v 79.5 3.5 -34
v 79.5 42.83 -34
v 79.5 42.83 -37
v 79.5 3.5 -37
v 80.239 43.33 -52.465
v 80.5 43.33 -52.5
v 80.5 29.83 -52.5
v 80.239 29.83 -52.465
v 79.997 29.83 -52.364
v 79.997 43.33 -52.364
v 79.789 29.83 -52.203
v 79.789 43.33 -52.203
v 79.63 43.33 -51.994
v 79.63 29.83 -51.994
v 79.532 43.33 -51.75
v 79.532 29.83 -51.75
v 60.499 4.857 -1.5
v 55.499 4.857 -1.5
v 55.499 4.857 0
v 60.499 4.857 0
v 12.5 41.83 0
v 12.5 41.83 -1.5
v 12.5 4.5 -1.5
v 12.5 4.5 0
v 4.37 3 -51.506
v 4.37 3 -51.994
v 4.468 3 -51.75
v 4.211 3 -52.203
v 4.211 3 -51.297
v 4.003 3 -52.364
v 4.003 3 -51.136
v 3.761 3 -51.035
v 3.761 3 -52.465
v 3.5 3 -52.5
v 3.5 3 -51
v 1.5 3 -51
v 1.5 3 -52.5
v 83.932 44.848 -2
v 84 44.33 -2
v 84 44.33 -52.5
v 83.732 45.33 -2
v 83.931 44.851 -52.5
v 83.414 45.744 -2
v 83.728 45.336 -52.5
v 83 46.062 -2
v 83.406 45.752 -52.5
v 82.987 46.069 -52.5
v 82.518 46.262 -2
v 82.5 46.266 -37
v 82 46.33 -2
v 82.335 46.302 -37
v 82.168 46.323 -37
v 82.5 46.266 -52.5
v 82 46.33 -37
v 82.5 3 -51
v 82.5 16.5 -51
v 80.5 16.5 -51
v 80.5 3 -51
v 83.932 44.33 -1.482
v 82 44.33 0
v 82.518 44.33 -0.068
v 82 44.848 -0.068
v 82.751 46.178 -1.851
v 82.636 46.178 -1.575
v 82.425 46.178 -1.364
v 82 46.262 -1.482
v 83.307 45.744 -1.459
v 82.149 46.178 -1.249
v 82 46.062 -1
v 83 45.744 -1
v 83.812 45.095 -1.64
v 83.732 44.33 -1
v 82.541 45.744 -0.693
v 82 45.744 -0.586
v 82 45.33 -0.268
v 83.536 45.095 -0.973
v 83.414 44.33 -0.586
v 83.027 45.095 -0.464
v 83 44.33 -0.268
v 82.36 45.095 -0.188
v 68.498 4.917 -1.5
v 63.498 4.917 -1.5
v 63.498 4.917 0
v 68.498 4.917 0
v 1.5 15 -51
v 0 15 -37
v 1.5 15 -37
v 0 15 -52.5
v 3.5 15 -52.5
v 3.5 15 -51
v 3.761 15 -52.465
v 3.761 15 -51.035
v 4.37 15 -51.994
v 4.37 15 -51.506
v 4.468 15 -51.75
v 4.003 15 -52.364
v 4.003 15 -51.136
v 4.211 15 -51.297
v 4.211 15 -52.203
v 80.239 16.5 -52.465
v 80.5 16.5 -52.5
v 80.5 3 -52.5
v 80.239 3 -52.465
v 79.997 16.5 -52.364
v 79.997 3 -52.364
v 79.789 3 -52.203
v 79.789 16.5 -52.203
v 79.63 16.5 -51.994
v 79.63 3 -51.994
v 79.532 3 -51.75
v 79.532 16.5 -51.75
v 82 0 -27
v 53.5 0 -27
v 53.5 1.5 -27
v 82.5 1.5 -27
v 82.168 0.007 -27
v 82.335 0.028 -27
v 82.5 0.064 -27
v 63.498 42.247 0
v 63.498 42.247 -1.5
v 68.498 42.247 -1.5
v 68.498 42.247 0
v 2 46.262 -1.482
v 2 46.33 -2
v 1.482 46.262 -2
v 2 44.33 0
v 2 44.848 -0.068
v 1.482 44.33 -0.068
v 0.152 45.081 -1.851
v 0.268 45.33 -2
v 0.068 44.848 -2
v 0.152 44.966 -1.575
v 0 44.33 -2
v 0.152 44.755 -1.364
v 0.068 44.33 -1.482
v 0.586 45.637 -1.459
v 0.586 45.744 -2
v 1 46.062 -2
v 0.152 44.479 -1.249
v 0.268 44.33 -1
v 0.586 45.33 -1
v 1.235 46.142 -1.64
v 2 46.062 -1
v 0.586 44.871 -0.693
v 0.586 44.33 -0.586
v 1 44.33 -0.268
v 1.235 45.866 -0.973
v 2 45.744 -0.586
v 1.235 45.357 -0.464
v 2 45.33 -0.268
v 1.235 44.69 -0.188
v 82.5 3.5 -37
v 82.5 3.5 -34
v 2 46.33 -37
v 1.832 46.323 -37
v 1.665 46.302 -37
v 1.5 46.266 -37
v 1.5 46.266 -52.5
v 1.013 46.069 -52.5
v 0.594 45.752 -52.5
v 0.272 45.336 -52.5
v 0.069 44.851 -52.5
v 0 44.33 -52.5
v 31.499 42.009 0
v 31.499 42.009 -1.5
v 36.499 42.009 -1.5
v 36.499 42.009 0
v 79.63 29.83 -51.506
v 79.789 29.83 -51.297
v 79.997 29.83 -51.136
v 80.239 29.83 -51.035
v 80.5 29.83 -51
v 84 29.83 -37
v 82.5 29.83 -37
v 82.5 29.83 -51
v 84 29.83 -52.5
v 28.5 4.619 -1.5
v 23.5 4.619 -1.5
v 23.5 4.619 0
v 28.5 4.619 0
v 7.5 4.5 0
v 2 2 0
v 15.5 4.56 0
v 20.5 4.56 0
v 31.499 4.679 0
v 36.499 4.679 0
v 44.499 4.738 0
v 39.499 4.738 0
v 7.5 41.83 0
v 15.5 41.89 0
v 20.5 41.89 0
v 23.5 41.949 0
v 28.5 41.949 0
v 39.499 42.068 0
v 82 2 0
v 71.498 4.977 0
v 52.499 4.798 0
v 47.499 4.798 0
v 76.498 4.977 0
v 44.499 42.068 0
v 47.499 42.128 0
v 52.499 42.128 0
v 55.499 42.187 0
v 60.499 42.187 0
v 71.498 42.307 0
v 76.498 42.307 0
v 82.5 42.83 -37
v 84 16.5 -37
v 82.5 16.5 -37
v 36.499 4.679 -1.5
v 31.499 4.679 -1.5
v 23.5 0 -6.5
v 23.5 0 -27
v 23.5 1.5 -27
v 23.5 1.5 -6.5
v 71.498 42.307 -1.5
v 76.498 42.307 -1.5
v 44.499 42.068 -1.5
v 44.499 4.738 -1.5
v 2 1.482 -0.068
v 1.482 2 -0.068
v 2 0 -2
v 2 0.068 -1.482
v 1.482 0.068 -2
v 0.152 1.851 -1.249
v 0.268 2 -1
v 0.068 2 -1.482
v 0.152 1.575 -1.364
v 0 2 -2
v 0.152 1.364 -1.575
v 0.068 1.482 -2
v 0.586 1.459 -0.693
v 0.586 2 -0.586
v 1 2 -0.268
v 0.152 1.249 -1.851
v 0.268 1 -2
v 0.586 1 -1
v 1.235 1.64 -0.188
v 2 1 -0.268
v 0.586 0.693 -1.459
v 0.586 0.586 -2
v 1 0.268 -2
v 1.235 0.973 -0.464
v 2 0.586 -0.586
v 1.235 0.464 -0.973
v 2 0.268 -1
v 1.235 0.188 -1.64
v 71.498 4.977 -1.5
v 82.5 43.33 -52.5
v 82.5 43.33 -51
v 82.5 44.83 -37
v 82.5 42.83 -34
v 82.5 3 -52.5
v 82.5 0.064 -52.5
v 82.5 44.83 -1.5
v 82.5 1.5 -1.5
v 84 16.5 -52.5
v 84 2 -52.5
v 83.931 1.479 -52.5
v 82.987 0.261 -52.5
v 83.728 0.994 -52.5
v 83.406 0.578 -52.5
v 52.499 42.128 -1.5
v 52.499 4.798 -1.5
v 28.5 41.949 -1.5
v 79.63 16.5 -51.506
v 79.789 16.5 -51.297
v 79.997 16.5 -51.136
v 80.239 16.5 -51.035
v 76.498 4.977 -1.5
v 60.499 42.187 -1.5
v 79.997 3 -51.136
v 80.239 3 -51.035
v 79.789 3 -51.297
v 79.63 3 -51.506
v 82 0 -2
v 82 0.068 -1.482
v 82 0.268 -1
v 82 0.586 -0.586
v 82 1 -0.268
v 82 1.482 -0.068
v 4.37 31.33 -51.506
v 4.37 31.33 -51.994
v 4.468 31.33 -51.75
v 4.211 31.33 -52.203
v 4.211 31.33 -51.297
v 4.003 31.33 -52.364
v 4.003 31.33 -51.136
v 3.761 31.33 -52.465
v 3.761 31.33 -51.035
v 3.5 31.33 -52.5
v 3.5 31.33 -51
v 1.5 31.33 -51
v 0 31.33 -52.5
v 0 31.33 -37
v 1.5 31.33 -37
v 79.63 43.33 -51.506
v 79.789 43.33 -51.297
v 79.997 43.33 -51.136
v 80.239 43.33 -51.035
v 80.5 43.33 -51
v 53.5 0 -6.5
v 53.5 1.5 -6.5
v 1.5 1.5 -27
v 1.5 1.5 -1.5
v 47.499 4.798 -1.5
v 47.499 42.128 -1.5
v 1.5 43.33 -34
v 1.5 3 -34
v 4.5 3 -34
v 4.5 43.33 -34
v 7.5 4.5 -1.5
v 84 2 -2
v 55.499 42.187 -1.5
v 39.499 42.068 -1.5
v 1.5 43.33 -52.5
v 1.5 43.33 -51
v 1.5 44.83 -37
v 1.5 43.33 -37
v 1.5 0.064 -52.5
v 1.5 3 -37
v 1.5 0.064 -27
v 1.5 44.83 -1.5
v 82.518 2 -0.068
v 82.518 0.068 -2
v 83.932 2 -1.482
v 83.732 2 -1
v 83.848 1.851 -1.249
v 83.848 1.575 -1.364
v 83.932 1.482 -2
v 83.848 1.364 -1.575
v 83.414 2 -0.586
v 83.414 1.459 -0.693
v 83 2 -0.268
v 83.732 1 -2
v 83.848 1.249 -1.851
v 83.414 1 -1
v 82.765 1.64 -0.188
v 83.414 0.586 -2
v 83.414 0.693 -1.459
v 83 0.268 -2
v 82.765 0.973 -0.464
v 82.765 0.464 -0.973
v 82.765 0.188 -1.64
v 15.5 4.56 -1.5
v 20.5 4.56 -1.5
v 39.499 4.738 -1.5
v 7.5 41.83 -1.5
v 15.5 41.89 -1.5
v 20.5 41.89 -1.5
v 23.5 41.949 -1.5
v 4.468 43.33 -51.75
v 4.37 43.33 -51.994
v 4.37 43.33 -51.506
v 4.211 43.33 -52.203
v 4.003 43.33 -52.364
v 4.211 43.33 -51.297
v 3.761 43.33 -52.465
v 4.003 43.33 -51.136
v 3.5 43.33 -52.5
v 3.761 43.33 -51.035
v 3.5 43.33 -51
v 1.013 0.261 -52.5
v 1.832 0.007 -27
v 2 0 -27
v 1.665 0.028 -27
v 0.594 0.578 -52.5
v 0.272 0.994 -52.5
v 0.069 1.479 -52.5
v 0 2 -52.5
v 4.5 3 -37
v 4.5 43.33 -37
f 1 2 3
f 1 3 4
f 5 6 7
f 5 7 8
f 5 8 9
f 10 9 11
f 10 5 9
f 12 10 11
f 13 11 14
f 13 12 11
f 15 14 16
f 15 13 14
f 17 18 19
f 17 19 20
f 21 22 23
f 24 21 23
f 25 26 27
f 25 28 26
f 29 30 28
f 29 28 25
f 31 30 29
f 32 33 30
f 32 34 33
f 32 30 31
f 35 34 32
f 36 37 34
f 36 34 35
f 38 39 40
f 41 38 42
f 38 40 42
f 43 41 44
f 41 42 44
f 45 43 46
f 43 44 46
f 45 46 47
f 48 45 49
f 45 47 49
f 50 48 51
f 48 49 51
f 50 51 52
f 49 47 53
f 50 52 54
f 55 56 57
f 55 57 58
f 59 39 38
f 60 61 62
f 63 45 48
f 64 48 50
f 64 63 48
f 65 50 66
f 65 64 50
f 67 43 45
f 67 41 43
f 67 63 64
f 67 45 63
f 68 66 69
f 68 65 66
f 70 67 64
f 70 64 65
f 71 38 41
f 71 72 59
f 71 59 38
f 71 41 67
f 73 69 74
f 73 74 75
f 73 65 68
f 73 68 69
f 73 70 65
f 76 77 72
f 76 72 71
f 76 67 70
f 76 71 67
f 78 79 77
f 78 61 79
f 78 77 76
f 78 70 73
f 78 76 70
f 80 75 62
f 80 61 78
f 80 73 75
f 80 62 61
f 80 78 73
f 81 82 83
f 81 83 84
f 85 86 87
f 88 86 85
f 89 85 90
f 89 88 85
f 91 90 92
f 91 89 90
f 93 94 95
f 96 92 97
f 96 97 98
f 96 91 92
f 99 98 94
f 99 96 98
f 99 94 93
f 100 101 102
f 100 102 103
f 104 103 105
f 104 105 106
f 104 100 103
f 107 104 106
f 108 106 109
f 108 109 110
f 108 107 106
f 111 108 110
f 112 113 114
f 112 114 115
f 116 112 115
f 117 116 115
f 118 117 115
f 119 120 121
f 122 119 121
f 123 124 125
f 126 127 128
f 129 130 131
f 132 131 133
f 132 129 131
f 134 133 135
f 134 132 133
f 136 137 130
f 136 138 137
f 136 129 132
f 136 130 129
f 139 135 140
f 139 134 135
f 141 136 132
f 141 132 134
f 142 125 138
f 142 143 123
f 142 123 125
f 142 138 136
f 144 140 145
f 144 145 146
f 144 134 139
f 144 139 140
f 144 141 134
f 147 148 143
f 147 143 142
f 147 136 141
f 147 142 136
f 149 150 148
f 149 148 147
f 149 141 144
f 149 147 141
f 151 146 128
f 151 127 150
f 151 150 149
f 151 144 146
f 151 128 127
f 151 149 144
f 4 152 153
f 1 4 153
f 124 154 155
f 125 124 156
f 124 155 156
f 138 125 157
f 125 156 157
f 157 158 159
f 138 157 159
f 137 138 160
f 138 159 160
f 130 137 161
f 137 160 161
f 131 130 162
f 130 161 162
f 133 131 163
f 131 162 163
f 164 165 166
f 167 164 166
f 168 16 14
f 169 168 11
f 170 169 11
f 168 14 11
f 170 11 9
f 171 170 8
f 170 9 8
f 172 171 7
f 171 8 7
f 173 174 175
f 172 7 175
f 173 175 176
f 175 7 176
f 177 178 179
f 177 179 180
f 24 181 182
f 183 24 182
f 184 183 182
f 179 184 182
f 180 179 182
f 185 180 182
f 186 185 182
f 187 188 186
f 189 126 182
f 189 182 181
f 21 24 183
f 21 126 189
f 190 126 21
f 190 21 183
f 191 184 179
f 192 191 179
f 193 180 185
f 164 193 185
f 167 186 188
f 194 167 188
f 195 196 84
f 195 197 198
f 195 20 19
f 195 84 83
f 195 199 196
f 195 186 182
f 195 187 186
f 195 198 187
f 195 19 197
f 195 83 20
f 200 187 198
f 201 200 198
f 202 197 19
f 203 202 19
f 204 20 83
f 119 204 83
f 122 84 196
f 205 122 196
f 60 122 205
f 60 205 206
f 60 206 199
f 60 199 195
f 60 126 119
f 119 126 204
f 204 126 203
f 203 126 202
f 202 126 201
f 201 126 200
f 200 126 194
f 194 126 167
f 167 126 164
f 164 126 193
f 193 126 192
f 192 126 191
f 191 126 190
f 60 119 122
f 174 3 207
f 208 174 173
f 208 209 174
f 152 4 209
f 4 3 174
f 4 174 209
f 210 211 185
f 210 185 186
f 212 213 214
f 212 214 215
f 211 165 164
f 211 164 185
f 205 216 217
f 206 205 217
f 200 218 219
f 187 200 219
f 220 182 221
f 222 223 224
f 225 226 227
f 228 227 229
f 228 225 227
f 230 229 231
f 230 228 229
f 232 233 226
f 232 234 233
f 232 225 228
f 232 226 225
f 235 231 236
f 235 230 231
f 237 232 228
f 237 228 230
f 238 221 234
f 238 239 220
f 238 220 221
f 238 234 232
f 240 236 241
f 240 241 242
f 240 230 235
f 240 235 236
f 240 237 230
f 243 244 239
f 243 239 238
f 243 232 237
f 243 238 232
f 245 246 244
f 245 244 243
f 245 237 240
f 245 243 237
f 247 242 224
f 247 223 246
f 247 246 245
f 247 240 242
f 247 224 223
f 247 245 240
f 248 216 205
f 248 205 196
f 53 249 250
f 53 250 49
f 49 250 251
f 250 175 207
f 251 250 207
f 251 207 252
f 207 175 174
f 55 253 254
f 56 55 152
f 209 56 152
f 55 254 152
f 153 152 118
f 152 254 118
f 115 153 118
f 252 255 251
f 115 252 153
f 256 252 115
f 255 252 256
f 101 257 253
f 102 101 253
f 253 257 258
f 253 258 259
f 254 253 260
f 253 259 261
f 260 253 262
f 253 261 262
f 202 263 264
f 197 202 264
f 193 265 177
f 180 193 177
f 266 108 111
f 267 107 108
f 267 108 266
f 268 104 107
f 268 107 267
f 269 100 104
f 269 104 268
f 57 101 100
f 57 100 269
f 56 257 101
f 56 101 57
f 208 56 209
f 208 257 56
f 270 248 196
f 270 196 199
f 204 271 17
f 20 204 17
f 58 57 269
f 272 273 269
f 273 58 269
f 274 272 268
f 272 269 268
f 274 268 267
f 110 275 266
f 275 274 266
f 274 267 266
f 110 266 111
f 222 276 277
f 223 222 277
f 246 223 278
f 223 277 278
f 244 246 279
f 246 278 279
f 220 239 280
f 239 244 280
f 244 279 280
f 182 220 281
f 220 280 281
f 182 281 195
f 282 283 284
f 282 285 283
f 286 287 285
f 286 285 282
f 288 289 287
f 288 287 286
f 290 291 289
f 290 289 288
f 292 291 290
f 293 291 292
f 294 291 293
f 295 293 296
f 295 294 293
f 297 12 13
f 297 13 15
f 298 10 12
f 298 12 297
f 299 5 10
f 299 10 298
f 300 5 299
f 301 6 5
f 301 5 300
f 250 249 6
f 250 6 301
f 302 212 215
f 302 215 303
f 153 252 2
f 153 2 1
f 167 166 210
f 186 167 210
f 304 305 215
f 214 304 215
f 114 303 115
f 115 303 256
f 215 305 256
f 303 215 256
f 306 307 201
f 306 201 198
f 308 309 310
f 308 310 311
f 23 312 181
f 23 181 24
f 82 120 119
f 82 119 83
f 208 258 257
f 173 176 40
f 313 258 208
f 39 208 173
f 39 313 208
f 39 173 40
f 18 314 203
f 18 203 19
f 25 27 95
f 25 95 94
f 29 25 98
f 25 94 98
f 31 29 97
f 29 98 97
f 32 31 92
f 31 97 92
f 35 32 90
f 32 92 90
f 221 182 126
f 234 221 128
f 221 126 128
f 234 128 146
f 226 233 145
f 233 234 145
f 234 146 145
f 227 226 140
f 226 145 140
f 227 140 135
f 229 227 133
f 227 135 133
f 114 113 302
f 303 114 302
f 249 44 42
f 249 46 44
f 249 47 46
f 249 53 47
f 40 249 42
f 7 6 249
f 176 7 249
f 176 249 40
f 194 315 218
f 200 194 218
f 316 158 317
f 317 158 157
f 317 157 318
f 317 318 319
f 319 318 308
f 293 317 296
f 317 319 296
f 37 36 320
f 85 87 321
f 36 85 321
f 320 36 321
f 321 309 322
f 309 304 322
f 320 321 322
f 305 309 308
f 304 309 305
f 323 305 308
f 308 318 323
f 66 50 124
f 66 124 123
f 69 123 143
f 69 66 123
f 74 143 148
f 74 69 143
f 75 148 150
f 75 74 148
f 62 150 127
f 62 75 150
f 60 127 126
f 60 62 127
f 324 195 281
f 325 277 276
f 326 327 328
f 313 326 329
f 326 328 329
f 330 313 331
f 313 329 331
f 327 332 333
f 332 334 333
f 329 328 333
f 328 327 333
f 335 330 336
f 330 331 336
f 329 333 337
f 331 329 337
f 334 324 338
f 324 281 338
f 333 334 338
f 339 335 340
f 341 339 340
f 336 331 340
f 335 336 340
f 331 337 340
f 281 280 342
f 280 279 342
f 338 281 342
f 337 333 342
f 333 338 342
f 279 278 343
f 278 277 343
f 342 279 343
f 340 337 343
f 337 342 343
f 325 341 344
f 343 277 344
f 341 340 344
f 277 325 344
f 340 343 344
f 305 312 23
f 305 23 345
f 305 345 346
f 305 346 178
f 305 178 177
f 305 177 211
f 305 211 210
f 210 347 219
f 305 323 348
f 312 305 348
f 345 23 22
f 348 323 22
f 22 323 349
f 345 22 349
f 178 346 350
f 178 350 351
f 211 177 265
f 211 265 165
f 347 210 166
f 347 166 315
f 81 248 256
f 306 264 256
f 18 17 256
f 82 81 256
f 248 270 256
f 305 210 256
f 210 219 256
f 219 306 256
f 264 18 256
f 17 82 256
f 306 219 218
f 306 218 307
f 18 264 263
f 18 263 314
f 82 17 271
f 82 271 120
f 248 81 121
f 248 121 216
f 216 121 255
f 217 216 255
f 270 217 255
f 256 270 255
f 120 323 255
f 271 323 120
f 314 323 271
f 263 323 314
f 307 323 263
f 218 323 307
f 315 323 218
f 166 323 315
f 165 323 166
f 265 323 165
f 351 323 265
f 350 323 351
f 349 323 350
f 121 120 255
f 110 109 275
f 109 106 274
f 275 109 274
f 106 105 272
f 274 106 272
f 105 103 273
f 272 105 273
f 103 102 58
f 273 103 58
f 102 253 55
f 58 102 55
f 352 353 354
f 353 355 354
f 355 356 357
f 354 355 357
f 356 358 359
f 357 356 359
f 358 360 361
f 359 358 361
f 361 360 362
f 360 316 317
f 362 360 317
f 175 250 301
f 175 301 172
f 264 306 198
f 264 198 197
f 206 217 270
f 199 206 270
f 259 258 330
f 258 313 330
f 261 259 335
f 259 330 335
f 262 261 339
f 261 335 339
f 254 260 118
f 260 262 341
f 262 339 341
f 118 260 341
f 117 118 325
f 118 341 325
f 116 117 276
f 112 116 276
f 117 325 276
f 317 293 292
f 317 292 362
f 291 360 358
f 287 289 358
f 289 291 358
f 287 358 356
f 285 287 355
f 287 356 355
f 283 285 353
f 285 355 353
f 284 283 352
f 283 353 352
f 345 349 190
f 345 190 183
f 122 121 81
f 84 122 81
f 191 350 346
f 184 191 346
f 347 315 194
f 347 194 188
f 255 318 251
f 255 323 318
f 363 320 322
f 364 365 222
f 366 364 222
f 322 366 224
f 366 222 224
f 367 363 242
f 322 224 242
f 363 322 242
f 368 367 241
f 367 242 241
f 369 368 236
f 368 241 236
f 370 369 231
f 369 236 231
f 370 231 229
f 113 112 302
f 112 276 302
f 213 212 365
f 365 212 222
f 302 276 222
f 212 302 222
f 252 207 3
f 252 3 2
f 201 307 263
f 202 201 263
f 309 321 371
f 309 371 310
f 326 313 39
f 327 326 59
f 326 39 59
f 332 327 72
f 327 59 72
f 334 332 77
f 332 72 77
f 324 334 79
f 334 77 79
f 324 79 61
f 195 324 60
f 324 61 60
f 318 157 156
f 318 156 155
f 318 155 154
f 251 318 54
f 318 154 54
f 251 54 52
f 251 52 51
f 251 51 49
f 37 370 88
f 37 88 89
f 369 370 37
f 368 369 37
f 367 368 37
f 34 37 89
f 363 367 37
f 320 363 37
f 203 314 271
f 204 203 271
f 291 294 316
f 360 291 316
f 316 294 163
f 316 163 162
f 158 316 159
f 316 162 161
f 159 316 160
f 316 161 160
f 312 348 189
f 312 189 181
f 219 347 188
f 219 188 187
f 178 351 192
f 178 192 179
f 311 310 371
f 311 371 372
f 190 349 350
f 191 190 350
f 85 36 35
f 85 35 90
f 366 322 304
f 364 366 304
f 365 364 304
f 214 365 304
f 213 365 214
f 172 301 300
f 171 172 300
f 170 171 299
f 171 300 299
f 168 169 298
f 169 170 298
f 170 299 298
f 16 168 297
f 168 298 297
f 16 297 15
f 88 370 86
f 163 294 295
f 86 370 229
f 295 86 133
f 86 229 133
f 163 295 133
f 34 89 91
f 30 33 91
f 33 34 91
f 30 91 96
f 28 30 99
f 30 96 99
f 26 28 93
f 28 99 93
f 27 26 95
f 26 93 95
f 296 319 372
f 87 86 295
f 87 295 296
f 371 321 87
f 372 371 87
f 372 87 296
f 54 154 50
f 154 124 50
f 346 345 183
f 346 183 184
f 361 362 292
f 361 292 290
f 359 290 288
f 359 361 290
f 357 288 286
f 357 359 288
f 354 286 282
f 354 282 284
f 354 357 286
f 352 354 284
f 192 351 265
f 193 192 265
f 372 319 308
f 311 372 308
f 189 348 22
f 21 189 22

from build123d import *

# Parameters (mm, degrees)
F0_W         = 84
F0_H         = 46.33
F1_DEPTH     = 37
F2_T         = -1.5
F4_W         = 81
F4_H         = 10
F5_DEPTH     = 1.5
F6_W         = 30
F6_H         = 20.5
F7_DEPTH     = 1.5
F9_DEPTH     = 15.5
F10_W        = 40.33
F10_H        = 3
F11_DEPTH    = 3
F12_W        = 39.33
F12_H        = 3
F13_DEPTH    = 3
F14_W        = 1.5
F14_H        = 13.33
F15_DEPTH    = 15.5
F16_W        = 1.5
F16_H        = 16.33
F17_DEPTH    = 15.5
F18_W        = 12
F18_H        = 1.5
F19_DEPTH    = 3
F20_W        = 13.5
F20_H        = 1.5
F21_DEPTH    = 3
F22_W        = 5
F22_H        = 37.33
F23_DEPTH    = 1.5
F24_R        = 2
F25_T1_DEPTH = 17
F25_T3_DEPTH = 17
F25_T5_DEPTH = 18.5
F25_T7_DEPTH = 18.5


# Not quite as in the source:
# - a fillet or chamfer that OpenCascade refuses, or shapes differently, is made with other operations: its cross-section is extruded or revolved along the edge and cut away or added


with BuildPart() as f1:
    # F0 (on Top) → F1 (new body)
    with BuildSketch(Plane.XY):
        with Locations((42, 23.165)):
            Rectangle(F0_W, F0_H)
    extrude(amount=-F1_DEPTH)

    # F2
    f2_openings = [f1.faces().sort_by_distance(p)[0] for p in [
        (42, 23.165, -37),
    ]]
    offset(amount=F2_T, openings=f2_openings)

    # F4 (on face) → F5 (cut, through all)
    with BuildSketch(Plane.XZ):
        with Locations((42, -32)):
            Rectangle(F4_W, F4_H)
    extrude(amount=-F5_DEPTH, mode=Mode.SUBTRACT)

    # F6 (on face) → F7 (cut, through all)
    with BuildSketch(Plane.XZ):
        with Locations((38.5, -16.75)):
            Rectangle(F6_W, F6_H)
    extrude(amount=-F7_DEPTH, mode=Mode.SUBTRACT)

    # F8 (on face) → F9 (join)
    with BuildSketch(Plane(origin=(0, 0, -37), x_dir=(1, 0, 0), z_dir=(0, 0, -1))):
        Polygon((0, 0), (0, -46.33), (1.5, -46.33), (1.5, -44.83), (1.5, 0), align=None)
        Polygon((82.5, -44.83), (82.5, -46.33), (84, -46.33), (84, 0), (82.5, 0), align=None)
    extrude(amount=F9_DEPTH)

    # F10 (on face) → F11 (join)
    with BuildSketch(Plane.YZ.offset(1.5)):
        with Locations((23.165, -35.5)):
            Rectangle(F10_W, F10_H)
    extrude(amount=F11_DEPTH)

    # F12 (on face) → F13 (join)
    with BuildSketch(Plane(origin=(82.5, 0, 0), x_dir=(0, -1, 0), z_dir=(-1, 0, 0))):
        with Locations((-23.165, -35.5)):
            Rectangle(F12_W, F12_H)
    extrude(amount=F13_DEPTH)

    # F14 (on face) → F15 (cut)
    with BuildSketch(Plane(origin=(0, 0, -52.5), x_dir=(1, 0, 0), z_dir=(0, 0, -1))):
        with Locations((83.25, -23.165)):
            Rectangle(F14_W, F14_H)
    extrude(amount=-F15_DEPTH, mode=Mode.SUBTRACT)

    # F16 (on face) → F17 (cut)
    with BuildSketch(Plane(origin=(0, 0, -52.5), x_dir=(1, 0, 0), z_dir=(0, 0, -1))):
        with Locations((0.75, -23.165)):
            Rectangle(F16_W, F16_H)
    extrude(amount=-F17_DEPTH, mode=Mode.SUBTRACT)

    # F18 (on face) → F19 (join)
    with BuildSketch(Plane.YZ.offset(1.5)):
        with Locations((37.33, -51.75)):
            Rectangle(F18_W, F18_H)
        with Locations((9, -51.75)):
            Rectangle(F18_W, F18_H)
    extrude(amount=F19_DEPTH)

    # F20 (on face) → F21 (join)
    with BuildSketch(Plane(origin=(82.5, 0, 0), x_dir=(0, -1, 0), z_dir=(-1, 0, 0))):
        with Locations((-9.75, -51.75)):
            Rectangle(F20_W, F20_H)
        with Locations((-36.58, -51.75)):
            Rectangle(F20_W, F20_H)
    extrude(amount=F21_DEPTH)

    # F22 (on face) → F23 (cut, through all)
    with BuildSketch(Plane(origin=(0, 0, -1.5), x_dir=(1, 0, 0), z_dir=(0, 0, -1))):
        with Locations((73.9982255152, -23.6415825304)):
            Rectangle(F22_W, F22_H)
        with Locations((65.9984473258, -23.5820097141)):
            Rectangle(F22_W, F22_H)
        with Locations((49.998890947, -23.4628640815)):
            Rectangle(F22_W, F22_H)
        with Locations((41.9991127576, -23.4032912652)):
            Rectangle(F22_W, F22_H)
        with Locations((33.9993345682, -23.3437184489)):
            Rectangle(F22_W, F22_H)
        with Locations((25.9995563788, -23.2841456326)):
            Rectangle(F22_W, F22_H)
        with Locations((17.9997781894, -23.2245728163)):
            Rectangle(F22_W, F22_H)
        with Locations((10, -23.165)):
            Rectangle(F22_W, F22_H)
        with Locations((57.9986691364, -23.5224368978)):
            Rectangle(F22_W, F22_H)
    extrude(amount=-F23_DEPTH, mode=Mode.SUBTRACT)

    # F24
    f24_edges = [f1.edges().sort_by_distance(p)[0] for p in [
        (42, 0, 0),
        (84, 23.165, 0),
        (84, 0, -26.25),
        (84, 46.33, -26.25),
        (42, 46.33, 0),
        (0, 46.33, -26.25),
        (0, 23.165, 0),
        (0, 0, -26.25),
    ]]
    fillet(f24_edges, radius=F24_R)

    # F25: fillet of radius 1 on 8 edges, made by hand

    # F25_s2 → F25_t1 (cut)
    with BuildSketch(Plane.XZ.offset(-17.5)):
        with BuildLine():
            ThreePointArc((3.5, -52.5), (4.2071067812, -52.2071067812), (4.5, -51.5))
            Line((4.5, -51.5), (4.5, -52.5))
            Line((4.5, -52.5), (3.5, -52.5))
        make_face()
        with BuildLine():
            ThreePointArc((4.5, -52), (4.2071067812, -51.2928932188), (3.5, -51))
            Line((3.5, -51), (4.5, -51))
            Line((4.5, -51), (4.5, -52))
        make_face()
    extrude(amount=F25_T1_DEPTH, mode=Mode.SUBTRACT)

    # F25_s4 → F25_t3 (cut)
    with BuildSketch(Plane.XZ.offset(-45.83)):
        with BuildLine():
            ThreePointArc((3.5, -52.5), (4.2071067812, -52.2071067812), (4.5, -51.5))
            Line((4.5, -51.5), (4.5, -52.5))
            Line((4.5, -52.5), (3.5, -52.5))
        make_face()
        with BuildLine():
            ThreePointArc((3.5, -51), (4.2071067812, -51.2928932188), (4.5, -52))
            Line((4.5, -52), (4.5, -51))
            Line((4.5, -51), (3.5, -51))
        make_face()
    extrude(amount=F25_T3_DEPTH, mode=Mode.SUBTRACT)

    # F25_s6 → F25_t5 (cut)
    with BuildSketch(Plane.XZ.offset(-19)):
        with BuildLine():
            ThreePointArc((80.5, -51), (79.7928932188, -51.2928932188), (79.5, -52))
            Line((79.5, -52), (79.5, -51))
            Line((79.5, -51), (80.5, -51))
        make_face()
        with BuildLine():
            ThreePointArc((80.5, -52.5), (79.7928932188, -52.2071067812), (79.5, -51.5))
            Line((79.5, -51.5), (79.5, -52.5))
            Line((79.5, -52.5), (80.5, -52.5))
        make_face()
    extrude(amount=F25_T5_DEPTH, mode=Mode.SUBTRACT)

    # F25_s8 → F25_t7 (cut)
    with BuildSketch(Plane.XZ.offset(-45.83)):
        with BuildLine():
            ThreePointArc((80.5, -52.5), (79.7928932188, -52.2071067812), (79.5, -51.5))
            Line((79.5, -51.5), (79.5, -52.5))
            Line((79.5, -52.5), (80.5, -52.5))
        make_face()
        with BuildLine():
            ThreePointArc((80.5, -51), (79.7928932188, -51.2928932188), (79.5, -52))
            Line((79.5, -52), (79.5, -51))
            Line((79.5, -51), (80.5, -51))
        make_face()
    extrude(amount=F25_T7_DEPTH, mode=Mode.SUBTRACT)


solid = f1.part
